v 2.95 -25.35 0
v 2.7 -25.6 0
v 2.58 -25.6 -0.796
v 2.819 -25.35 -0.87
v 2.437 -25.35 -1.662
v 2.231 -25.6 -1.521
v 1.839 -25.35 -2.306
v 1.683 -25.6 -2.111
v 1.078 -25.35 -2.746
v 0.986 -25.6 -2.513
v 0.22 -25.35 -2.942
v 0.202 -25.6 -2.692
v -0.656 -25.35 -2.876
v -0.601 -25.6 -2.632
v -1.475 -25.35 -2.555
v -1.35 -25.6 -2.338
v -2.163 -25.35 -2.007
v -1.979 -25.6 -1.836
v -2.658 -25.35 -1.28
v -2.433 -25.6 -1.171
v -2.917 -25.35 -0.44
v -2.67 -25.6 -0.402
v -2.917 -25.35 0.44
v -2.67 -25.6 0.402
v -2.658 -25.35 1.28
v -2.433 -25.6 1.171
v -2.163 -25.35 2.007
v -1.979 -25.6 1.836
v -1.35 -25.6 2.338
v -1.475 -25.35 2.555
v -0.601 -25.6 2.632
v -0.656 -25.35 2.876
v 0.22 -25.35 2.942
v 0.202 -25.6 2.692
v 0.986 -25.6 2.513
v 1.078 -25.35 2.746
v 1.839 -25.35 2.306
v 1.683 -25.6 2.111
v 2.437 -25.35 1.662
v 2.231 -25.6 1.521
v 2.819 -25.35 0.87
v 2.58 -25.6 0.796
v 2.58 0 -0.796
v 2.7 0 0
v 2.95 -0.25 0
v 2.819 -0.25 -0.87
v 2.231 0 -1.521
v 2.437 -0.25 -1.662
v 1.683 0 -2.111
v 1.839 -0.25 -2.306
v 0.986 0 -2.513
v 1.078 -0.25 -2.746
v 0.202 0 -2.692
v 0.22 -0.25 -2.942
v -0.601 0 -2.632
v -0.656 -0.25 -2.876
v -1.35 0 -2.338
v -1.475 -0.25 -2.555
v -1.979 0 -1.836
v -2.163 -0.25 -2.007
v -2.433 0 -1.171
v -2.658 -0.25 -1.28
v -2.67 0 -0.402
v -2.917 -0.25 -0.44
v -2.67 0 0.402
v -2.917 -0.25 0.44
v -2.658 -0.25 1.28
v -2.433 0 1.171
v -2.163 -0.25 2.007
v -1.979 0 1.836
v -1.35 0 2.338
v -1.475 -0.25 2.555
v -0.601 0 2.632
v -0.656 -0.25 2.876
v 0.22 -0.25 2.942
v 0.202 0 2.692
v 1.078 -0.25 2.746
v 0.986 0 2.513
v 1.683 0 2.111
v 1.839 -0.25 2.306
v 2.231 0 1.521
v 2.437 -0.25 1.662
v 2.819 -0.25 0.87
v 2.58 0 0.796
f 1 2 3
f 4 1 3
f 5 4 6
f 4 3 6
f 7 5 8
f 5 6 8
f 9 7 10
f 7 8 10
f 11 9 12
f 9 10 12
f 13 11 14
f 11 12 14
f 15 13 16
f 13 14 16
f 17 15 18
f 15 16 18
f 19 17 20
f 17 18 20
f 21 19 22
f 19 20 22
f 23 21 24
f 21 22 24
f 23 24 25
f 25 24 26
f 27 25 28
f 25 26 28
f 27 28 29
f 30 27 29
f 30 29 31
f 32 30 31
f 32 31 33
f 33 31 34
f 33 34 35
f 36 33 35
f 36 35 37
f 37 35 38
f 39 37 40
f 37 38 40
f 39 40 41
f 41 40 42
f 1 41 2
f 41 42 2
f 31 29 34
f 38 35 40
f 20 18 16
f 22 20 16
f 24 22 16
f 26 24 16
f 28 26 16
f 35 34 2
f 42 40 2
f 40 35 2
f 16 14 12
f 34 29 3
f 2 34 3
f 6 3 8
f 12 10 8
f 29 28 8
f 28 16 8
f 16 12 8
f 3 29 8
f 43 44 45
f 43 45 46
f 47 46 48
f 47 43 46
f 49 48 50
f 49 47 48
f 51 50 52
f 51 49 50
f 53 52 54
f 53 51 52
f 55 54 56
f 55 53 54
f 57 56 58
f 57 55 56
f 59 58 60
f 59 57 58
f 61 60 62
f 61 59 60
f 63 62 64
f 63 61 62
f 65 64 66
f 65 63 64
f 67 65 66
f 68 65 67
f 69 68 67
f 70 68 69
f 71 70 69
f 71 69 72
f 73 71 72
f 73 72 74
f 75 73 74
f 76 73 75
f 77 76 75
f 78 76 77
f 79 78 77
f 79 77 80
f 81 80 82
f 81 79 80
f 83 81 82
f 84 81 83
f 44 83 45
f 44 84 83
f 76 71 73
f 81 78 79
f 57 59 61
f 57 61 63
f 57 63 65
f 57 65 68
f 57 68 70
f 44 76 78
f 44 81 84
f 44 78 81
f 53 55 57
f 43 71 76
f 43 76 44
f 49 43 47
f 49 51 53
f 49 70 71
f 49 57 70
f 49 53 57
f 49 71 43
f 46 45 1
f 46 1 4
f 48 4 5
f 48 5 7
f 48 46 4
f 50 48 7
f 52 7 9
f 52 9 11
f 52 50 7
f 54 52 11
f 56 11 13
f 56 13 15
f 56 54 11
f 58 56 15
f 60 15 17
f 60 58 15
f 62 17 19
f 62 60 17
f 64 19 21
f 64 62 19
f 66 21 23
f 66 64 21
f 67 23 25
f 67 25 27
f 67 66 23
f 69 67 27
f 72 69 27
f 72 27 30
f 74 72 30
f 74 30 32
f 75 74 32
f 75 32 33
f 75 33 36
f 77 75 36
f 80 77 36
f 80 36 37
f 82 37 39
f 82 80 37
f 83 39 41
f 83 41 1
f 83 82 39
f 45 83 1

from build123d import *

# Parameters (mm, degrees)
SKETCH1_R           = 2.95
BOSS_EXTRUDE1_DEPTH = 25.6
CHAMFER3_SIZE       = 0.25
CHAMFER4_SIZE       = 0.25


with BuildPart() as part:
    # Sketch1 → Boss-Extrude1 (new body)
    with BuildSketch(Plane(origin=(0, 0, 0), x_dir=(1, 0, 0), z_dir=(0, 1, 0))):
        Circle(SKETCH1_R)
    extrude(amount=-BOSS_EXTRUDE1_DEPTH)

    # Chamfer3
    chamfer3_edges = [part.edges().sort_by_distance(p)[0] for p in [
        (-2.95, -25.6, 0),
    ]]
    chamfer(chamfer3_edges, length=CHAMFER3_SIZE)

    # Chamfer4
    chamfer4_edges = [part.edges().sort_by_distance(p)[0] for p in [
        (-2.95, 0, 0),
    ]]
    chamfer(chamfer4_edges, length=CHAMFER4_SIZE)


solid = part.part
